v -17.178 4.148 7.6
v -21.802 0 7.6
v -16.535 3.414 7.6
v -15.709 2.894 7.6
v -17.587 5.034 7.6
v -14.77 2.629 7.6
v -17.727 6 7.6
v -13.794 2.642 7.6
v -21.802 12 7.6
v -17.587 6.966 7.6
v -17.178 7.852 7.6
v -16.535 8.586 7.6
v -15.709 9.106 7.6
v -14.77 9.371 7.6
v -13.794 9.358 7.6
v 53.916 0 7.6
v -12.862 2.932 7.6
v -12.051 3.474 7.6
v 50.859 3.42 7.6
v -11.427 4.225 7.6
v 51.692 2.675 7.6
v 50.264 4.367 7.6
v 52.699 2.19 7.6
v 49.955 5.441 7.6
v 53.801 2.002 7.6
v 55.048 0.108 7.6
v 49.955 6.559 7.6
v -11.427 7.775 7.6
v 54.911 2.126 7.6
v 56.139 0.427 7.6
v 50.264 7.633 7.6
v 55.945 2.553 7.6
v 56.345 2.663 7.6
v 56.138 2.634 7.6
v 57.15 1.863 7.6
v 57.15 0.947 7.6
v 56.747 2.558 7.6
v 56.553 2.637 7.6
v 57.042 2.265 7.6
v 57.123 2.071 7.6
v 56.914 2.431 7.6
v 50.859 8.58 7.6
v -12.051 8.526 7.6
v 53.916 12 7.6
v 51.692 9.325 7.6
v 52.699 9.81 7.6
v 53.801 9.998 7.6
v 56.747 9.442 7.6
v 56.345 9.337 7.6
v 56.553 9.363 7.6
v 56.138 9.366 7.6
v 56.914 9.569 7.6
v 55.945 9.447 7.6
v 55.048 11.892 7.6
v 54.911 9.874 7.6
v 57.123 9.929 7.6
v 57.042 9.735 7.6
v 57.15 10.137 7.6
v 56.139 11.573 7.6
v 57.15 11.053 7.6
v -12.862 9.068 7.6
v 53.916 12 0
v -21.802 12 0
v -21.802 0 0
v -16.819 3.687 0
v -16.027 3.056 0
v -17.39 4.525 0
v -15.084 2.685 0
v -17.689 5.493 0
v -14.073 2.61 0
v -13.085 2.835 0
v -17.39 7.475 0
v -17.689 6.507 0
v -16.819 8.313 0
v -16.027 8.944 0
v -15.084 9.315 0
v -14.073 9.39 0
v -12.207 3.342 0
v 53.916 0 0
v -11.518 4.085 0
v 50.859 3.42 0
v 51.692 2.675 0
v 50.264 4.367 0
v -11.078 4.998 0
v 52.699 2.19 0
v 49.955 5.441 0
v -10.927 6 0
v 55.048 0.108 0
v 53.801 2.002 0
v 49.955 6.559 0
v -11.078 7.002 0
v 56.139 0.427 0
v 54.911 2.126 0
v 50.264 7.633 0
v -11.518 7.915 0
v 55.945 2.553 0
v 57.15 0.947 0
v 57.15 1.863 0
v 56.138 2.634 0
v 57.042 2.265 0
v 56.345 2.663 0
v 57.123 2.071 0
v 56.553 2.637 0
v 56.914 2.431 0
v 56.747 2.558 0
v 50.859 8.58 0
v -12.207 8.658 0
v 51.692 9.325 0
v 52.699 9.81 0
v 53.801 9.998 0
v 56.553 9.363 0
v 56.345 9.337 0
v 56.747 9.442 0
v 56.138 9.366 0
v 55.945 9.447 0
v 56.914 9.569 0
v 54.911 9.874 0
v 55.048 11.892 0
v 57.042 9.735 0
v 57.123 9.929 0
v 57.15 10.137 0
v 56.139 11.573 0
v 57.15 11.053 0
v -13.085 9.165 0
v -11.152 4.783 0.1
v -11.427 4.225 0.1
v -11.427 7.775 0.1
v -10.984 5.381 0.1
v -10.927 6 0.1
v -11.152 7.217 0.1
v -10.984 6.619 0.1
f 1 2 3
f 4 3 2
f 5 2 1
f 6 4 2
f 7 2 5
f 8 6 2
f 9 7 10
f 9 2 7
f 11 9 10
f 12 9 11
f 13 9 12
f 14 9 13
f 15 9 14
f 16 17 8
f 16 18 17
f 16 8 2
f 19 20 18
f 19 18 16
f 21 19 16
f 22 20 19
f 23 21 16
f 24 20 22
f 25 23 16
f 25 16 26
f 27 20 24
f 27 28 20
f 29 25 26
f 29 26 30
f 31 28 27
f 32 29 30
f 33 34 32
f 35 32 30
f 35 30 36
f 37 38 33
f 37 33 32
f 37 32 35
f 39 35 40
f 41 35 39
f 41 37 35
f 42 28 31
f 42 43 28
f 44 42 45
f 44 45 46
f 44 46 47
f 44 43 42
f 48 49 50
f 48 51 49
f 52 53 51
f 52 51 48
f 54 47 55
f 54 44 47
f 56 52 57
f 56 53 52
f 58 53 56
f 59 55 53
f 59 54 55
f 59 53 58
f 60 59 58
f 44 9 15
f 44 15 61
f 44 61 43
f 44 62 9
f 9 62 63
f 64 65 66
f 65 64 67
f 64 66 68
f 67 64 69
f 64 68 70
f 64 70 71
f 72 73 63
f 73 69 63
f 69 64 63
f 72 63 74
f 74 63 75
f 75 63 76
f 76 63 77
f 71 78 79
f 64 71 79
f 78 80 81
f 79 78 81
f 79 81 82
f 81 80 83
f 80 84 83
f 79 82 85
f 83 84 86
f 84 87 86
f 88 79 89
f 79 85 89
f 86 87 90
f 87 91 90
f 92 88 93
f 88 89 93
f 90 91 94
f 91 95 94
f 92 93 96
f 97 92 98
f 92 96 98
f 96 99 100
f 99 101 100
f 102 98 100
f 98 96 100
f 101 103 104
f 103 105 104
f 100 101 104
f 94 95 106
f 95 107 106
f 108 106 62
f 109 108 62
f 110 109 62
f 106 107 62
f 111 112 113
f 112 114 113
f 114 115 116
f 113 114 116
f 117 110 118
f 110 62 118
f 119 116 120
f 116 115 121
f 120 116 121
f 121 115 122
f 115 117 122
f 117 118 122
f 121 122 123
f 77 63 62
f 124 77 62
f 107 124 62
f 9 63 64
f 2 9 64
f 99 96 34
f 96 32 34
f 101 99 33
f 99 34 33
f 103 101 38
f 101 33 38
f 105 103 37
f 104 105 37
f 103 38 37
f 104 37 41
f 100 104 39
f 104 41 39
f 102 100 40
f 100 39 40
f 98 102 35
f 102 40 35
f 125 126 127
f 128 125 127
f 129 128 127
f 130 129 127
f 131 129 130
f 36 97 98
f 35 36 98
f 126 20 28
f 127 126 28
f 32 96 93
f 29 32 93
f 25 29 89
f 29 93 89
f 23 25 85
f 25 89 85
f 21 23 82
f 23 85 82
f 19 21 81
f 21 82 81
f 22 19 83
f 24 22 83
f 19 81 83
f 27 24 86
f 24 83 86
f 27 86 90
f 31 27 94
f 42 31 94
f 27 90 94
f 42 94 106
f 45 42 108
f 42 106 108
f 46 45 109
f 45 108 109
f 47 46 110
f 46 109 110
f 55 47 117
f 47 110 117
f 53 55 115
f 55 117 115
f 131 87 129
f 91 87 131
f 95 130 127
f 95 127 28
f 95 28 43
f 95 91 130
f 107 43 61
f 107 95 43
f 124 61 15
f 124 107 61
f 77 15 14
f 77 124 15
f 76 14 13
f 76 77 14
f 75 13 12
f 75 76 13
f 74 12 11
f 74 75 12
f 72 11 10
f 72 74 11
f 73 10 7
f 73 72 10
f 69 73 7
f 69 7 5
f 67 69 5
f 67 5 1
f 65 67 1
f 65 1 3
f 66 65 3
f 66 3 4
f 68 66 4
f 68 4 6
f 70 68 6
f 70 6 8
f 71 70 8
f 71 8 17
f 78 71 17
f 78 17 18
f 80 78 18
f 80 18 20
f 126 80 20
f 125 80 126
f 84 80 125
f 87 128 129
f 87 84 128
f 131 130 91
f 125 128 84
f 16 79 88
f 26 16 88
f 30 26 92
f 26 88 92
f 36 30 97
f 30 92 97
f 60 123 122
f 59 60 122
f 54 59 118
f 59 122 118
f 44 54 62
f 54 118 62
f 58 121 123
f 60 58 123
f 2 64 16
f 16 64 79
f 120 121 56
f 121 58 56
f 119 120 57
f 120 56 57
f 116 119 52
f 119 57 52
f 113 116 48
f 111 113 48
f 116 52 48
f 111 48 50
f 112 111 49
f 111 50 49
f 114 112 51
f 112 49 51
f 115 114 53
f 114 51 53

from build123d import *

# Parameters (mm, degrees)
SKETCH_1_R      = 3.4
EXTRUDE_2_DEPTH = 7.6
SKETCH_2_W      = 6.529029983
SKETCH_2_H      = 6.008592339
EXTRUDE_5_DEPTH = 7.5
FILLET_1_R      = 0.8


with BuildPart() as part:
    # 草图1 → 凸台-拉伸2 (new body)
    with BuildSketch(Plane.XY):
        with BuildLine():
            Line((53.915690558, 12), (-21.801891992, 12))
            Line((-21.801891992, 12), (-21.801891992, 0))
            Line((-21.801891992, 0), (53.915690558, 0))
            ThreePointArc((53.915690558, 0), (55.600804493, 0.241494028), (57.150270111, 0.946536325))
            Line((57.150270111, 0.946536325), (57.150270111, 3.646811713))
            ThreePointArc((57.150270111, 3.646811713), (49.915690558, 6), (57.150270111, 8.353188287))
            Line((57.150270111, 8.353188287), (57.150270111, 11.053463675))
            ThreePointArc((57.150270111, 11.053463675), (55.600804493, 11.758505972), (53.915690558, 12))
        make_face()
        with Locations((-14.326955942, 6)):
            Circle(SKETCH_1_R, mode=Mode.SUBTRACT)
    extrude(amount=EXTRUDE_2_DEPTH)

    # 草图2 → 凸台-拉伸5 (add)
    with BuildSketch(Plane.XY.offset(7.6)):
        with Locations((-8.162440951, 7.229472235)):
            Rectangle(SKETCH_2_W, SKETCH_2_H)
    extrude(amount=-EXTRUDE_5_DEPTH)

    # 圆角1
    fillet_1_edges = [part.edges().sort_by_distance(p)[0] for p in [
        (57.150270111, 8.353188287, 3.8),
        (57.150270111, 3.646811713, 3.8),
    ]]
    fillet(fillet_1_edges, radius=FILLET_1_R)


solid = part.part
